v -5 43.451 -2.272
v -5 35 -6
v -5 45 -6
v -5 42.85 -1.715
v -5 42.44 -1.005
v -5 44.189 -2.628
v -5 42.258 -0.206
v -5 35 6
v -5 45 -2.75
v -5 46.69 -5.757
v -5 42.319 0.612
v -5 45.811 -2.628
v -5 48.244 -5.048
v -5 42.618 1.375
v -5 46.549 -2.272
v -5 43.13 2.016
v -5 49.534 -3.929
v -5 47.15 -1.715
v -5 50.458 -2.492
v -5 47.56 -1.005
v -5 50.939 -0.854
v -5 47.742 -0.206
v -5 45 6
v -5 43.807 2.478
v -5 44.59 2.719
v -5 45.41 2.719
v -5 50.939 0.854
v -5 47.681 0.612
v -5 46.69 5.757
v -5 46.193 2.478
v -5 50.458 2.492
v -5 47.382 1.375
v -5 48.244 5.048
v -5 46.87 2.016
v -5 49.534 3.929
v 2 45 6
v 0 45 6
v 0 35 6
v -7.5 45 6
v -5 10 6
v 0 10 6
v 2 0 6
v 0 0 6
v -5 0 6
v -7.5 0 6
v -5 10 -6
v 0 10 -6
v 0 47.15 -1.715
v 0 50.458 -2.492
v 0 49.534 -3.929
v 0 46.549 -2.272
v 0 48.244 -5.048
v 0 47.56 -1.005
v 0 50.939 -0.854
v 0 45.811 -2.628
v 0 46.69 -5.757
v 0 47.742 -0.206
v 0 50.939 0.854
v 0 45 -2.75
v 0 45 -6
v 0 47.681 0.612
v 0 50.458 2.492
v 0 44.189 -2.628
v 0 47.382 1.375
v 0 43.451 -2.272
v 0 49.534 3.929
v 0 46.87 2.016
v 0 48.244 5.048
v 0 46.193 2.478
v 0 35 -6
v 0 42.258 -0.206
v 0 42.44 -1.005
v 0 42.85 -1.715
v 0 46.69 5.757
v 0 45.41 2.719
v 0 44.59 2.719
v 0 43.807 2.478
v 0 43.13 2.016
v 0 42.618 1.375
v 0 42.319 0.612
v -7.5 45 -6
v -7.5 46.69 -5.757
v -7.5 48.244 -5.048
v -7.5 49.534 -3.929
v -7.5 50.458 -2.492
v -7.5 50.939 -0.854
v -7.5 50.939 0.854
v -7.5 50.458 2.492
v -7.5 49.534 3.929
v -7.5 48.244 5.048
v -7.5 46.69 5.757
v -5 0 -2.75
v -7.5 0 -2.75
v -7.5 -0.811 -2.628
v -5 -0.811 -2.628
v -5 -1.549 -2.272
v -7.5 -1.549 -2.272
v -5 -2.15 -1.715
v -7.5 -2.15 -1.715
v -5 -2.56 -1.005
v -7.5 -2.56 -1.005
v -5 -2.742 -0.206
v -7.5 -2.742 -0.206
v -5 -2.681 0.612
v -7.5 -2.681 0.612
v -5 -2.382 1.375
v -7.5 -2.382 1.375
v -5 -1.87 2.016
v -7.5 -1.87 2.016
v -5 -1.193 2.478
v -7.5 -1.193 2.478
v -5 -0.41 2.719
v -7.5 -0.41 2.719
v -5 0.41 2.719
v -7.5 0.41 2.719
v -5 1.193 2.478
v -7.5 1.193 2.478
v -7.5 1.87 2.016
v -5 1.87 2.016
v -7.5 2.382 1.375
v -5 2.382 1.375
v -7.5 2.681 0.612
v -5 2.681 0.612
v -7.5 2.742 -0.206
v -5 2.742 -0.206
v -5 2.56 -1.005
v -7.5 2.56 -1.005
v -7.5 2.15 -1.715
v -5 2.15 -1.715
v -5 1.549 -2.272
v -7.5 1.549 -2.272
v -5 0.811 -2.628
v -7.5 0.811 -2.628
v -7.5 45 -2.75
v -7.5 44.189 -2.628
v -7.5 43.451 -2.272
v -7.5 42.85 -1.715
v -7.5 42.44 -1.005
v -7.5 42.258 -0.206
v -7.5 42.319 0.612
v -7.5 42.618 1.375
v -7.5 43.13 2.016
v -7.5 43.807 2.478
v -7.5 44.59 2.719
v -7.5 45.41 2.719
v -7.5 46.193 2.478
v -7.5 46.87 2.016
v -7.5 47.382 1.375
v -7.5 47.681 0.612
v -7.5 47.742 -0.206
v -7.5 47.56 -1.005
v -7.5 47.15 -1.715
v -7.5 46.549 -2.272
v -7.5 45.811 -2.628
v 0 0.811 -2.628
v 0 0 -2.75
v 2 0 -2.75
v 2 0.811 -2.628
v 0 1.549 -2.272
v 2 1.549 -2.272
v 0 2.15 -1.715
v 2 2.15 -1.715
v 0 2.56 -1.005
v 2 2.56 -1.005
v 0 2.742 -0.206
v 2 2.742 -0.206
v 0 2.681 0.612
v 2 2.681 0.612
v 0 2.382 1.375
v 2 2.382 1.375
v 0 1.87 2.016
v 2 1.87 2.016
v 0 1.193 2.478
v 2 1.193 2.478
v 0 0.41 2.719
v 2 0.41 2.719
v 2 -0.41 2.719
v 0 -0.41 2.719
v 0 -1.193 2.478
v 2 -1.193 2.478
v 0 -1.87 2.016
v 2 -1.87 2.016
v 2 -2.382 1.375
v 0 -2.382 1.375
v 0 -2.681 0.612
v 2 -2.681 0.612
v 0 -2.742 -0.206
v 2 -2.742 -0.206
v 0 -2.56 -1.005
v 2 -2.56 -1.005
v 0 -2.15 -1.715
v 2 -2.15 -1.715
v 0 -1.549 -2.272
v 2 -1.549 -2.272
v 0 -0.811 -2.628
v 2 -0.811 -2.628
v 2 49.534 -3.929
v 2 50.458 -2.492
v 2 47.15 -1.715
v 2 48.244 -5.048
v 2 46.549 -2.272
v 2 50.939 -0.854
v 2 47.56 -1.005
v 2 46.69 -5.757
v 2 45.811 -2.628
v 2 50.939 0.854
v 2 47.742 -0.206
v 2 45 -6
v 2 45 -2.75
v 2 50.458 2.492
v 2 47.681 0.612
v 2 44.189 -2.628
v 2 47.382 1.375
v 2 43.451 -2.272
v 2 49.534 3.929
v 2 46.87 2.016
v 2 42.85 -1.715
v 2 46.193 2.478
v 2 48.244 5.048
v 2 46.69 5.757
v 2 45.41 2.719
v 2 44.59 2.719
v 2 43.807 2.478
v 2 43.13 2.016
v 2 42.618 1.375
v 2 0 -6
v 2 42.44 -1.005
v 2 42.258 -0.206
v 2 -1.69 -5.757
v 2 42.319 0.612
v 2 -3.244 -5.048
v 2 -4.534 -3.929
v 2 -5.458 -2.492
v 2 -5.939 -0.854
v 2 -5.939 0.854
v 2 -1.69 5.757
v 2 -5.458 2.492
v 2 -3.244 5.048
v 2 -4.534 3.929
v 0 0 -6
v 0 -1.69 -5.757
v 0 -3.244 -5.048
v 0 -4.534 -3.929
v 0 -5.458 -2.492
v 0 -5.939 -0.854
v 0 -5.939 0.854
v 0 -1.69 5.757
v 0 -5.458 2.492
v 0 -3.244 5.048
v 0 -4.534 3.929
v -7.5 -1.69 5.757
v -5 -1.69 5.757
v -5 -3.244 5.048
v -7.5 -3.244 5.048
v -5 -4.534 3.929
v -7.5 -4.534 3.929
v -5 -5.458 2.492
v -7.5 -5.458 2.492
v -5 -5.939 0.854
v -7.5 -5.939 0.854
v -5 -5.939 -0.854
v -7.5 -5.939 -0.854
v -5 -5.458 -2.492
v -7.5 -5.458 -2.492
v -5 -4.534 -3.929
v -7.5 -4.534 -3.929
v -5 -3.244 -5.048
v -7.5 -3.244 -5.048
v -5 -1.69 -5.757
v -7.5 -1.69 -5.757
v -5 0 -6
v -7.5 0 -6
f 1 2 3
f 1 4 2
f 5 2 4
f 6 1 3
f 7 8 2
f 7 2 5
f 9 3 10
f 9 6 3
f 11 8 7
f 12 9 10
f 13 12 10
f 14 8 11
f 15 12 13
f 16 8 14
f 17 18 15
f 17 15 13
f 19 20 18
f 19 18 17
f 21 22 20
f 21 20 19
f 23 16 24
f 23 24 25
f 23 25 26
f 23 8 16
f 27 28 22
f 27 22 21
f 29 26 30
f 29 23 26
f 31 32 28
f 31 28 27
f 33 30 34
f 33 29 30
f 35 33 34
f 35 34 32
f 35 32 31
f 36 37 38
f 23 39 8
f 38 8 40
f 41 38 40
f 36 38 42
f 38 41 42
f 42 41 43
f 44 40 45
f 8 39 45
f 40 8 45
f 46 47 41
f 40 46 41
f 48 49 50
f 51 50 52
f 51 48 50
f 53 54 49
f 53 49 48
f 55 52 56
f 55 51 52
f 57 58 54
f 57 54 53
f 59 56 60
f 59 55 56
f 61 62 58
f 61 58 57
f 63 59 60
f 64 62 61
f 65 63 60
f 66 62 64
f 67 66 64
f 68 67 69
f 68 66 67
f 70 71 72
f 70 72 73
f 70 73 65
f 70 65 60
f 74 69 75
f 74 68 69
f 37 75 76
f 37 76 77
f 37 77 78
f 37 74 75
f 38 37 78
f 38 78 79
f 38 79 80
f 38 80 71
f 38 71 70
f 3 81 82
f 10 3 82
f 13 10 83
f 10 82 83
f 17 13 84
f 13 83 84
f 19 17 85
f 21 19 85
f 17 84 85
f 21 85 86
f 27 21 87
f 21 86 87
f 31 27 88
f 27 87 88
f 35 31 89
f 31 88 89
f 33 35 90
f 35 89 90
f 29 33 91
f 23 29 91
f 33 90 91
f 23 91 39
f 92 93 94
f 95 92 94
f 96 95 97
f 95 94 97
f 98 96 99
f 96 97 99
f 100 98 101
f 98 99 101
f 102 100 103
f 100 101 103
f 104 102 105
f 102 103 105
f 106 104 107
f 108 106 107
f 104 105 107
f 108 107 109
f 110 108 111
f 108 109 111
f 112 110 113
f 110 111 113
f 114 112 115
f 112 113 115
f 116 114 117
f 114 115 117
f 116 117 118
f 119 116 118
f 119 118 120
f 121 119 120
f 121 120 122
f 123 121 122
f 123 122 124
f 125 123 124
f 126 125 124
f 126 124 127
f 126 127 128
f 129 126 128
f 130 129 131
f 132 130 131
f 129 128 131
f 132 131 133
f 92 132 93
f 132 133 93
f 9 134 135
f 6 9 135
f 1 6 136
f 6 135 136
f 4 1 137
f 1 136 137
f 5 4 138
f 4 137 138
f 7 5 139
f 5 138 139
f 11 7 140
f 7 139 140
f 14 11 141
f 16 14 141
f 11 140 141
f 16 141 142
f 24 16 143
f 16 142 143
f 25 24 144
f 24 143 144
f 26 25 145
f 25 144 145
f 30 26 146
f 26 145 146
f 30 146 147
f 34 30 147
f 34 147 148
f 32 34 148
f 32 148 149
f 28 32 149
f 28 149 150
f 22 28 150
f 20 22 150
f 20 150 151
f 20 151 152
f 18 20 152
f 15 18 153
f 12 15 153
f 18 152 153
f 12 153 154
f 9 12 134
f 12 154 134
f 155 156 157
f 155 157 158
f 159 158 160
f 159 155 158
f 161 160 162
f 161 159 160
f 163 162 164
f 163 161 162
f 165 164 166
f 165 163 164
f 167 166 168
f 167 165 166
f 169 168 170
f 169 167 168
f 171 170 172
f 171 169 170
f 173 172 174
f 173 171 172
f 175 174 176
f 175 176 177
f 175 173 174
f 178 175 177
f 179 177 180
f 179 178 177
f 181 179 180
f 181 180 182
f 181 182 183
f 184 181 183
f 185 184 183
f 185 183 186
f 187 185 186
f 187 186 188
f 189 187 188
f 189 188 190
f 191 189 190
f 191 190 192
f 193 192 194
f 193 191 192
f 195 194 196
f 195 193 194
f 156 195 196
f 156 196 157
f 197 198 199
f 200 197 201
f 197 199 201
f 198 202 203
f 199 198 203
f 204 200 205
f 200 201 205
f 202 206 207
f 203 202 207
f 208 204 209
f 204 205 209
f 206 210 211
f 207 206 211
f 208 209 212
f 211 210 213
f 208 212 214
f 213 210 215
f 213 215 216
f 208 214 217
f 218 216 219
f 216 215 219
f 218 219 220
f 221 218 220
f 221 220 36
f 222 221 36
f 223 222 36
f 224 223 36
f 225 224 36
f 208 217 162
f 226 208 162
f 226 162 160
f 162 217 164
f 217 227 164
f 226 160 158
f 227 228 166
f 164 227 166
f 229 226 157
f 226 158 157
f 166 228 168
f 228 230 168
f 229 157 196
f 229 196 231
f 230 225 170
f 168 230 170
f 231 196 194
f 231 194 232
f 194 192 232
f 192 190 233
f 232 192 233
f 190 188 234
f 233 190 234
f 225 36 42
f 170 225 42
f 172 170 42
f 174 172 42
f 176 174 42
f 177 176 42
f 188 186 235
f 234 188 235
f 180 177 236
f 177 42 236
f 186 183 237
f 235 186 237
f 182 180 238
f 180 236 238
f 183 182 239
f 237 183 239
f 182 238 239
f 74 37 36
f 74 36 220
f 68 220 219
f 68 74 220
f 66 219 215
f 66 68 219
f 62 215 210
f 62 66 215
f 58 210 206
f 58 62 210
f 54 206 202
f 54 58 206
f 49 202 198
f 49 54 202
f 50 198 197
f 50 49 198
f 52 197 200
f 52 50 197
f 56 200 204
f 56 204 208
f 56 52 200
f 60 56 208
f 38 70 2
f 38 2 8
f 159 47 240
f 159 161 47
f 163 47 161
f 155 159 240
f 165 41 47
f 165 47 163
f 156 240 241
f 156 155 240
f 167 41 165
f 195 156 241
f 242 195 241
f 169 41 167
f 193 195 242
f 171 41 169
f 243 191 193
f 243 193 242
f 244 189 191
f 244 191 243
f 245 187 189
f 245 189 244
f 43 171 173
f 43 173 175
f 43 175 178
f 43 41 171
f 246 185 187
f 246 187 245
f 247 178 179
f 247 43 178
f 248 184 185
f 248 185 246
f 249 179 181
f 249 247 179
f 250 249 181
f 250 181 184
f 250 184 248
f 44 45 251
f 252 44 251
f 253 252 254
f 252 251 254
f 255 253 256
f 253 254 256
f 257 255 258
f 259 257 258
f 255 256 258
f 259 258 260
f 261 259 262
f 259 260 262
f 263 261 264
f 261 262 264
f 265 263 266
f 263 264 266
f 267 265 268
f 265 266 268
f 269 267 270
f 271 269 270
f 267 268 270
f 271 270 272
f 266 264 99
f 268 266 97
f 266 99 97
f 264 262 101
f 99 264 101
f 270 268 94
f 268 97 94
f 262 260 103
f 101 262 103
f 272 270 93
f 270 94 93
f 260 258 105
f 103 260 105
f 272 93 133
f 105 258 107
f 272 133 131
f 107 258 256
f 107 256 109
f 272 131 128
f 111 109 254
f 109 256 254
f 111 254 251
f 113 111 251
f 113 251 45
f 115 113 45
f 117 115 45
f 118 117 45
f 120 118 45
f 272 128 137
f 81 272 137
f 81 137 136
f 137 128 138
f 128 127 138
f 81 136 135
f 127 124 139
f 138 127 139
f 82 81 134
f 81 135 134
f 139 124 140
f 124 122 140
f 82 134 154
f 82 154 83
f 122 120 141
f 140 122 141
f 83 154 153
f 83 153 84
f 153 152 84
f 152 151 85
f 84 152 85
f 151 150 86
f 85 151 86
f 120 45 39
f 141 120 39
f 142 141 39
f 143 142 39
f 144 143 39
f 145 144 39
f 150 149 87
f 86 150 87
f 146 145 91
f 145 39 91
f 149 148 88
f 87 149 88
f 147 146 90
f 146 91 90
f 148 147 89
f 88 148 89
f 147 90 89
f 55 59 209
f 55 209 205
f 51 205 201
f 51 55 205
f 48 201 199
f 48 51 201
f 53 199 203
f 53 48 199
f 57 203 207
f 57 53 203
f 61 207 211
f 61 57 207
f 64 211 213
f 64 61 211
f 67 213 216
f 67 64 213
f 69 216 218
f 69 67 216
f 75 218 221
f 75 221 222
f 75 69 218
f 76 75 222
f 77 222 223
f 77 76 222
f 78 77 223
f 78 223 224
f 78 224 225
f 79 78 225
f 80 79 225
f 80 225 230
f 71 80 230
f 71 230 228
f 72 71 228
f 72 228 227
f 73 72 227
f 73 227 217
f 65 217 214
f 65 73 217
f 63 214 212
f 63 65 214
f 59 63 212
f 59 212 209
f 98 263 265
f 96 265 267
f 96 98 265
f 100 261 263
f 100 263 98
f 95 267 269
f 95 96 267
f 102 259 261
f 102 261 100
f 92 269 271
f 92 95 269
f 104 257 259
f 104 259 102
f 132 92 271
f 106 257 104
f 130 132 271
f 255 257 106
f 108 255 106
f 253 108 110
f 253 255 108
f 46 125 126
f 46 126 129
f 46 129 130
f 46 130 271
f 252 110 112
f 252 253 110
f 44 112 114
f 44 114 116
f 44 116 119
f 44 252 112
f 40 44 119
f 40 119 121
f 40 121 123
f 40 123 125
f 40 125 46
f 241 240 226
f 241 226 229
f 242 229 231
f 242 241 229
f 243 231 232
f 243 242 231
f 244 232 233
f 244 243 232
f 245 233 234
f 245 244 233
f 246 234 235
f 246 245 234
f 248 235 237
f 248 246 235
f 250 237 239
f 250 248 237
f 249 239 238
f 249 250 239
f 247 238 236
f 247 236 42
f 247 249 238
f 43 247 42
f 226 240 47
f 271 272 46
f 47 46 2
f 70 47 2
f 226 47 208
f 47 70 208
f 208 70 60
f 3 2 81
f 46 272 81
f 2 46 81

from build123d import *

# Parameters (mm, degrees)
SKETCH1_R           = 2.75
BOSS_EXTRUDE1_DEPTH = 2
SKETCH3_W           = 25
SKETCH3_H           = 12
BOSS_EXTRUDE2_DEPTH = 5
BOSS_EXTRUDE3_START = 2.5
SKETCH4_R           = 2.75
BOSS_EXTRUDE3_DEPTH = 2.5


with BuildPart() as part:
    # Sketch1 → Boss-Extrude1 (new body)
    with BuildSketch(Plane.YZ):
        with BuildLine():
            Line((0, 6), (45, 6))
            ThreePointArc((45, 6), (51, 0), (45, -6))
            Line((45, -6), (0, -6))
            ThreePointArc((0, -6), (-6, 0), (0, 6))
        make_face()
        with Locations(Location((0, 0, 0), (0, 0, 270))):
            Circle(SKETCH1_R, mode=Mode.SUBTRACT)
        with Locations(Location((45, 0, 0), (0, 0, 270))):
            Circle(SKETCH1_R, mode=Mode.SUBTRACT)
    extrude(amount=BOSS_EXTRUDE1_DEPTH)

    # Sketch3 → Boss-Extrude2 (add)
    with BuildSketch(Plane(origin=(0, 0, 0), x_dir=(0, -1, 0), z_dir=(-1, 0, 0))):
        with Locations((-22.5, 0)):
            Rectangle(SKETCH3_W, SKETCH3_H)
    extrude(amount=BOSS_EXTRUDE2_DEPTH)

    # Sketch4 → Boss-Extrude3 (add)
    with BuildSketch(Plane(origin=(-5, 0, 0), x_dir=(0, -1, 0), z_dir=(-1, 0, 0)).offset(BOSS_EXTRUDE3_START)):
        with BuildLine():
            Line((-45, 6), (0, 6))
            ThreePointArc((0, 6), (6, 0), (0, -6))
            Line((0, -6), (-45, -6))
            ThreePointArc((-45, -6), (-51, 0), (-45, 6))
        make_face()
        with Locations(Location((-45, 0, 0), (0, 0, 270))):
            Circle(SKETCH4_R, mode=Mode.SUBTRACT)
        with Locations(Location((0, 0, 0), (0, 0, 270))):
            Circle(SKETCH4_R, mode=Mode.SUBTRACT)
    extrude(amount=-BOSS_EXTRUDE3_DEPTH)


solid = part.part
